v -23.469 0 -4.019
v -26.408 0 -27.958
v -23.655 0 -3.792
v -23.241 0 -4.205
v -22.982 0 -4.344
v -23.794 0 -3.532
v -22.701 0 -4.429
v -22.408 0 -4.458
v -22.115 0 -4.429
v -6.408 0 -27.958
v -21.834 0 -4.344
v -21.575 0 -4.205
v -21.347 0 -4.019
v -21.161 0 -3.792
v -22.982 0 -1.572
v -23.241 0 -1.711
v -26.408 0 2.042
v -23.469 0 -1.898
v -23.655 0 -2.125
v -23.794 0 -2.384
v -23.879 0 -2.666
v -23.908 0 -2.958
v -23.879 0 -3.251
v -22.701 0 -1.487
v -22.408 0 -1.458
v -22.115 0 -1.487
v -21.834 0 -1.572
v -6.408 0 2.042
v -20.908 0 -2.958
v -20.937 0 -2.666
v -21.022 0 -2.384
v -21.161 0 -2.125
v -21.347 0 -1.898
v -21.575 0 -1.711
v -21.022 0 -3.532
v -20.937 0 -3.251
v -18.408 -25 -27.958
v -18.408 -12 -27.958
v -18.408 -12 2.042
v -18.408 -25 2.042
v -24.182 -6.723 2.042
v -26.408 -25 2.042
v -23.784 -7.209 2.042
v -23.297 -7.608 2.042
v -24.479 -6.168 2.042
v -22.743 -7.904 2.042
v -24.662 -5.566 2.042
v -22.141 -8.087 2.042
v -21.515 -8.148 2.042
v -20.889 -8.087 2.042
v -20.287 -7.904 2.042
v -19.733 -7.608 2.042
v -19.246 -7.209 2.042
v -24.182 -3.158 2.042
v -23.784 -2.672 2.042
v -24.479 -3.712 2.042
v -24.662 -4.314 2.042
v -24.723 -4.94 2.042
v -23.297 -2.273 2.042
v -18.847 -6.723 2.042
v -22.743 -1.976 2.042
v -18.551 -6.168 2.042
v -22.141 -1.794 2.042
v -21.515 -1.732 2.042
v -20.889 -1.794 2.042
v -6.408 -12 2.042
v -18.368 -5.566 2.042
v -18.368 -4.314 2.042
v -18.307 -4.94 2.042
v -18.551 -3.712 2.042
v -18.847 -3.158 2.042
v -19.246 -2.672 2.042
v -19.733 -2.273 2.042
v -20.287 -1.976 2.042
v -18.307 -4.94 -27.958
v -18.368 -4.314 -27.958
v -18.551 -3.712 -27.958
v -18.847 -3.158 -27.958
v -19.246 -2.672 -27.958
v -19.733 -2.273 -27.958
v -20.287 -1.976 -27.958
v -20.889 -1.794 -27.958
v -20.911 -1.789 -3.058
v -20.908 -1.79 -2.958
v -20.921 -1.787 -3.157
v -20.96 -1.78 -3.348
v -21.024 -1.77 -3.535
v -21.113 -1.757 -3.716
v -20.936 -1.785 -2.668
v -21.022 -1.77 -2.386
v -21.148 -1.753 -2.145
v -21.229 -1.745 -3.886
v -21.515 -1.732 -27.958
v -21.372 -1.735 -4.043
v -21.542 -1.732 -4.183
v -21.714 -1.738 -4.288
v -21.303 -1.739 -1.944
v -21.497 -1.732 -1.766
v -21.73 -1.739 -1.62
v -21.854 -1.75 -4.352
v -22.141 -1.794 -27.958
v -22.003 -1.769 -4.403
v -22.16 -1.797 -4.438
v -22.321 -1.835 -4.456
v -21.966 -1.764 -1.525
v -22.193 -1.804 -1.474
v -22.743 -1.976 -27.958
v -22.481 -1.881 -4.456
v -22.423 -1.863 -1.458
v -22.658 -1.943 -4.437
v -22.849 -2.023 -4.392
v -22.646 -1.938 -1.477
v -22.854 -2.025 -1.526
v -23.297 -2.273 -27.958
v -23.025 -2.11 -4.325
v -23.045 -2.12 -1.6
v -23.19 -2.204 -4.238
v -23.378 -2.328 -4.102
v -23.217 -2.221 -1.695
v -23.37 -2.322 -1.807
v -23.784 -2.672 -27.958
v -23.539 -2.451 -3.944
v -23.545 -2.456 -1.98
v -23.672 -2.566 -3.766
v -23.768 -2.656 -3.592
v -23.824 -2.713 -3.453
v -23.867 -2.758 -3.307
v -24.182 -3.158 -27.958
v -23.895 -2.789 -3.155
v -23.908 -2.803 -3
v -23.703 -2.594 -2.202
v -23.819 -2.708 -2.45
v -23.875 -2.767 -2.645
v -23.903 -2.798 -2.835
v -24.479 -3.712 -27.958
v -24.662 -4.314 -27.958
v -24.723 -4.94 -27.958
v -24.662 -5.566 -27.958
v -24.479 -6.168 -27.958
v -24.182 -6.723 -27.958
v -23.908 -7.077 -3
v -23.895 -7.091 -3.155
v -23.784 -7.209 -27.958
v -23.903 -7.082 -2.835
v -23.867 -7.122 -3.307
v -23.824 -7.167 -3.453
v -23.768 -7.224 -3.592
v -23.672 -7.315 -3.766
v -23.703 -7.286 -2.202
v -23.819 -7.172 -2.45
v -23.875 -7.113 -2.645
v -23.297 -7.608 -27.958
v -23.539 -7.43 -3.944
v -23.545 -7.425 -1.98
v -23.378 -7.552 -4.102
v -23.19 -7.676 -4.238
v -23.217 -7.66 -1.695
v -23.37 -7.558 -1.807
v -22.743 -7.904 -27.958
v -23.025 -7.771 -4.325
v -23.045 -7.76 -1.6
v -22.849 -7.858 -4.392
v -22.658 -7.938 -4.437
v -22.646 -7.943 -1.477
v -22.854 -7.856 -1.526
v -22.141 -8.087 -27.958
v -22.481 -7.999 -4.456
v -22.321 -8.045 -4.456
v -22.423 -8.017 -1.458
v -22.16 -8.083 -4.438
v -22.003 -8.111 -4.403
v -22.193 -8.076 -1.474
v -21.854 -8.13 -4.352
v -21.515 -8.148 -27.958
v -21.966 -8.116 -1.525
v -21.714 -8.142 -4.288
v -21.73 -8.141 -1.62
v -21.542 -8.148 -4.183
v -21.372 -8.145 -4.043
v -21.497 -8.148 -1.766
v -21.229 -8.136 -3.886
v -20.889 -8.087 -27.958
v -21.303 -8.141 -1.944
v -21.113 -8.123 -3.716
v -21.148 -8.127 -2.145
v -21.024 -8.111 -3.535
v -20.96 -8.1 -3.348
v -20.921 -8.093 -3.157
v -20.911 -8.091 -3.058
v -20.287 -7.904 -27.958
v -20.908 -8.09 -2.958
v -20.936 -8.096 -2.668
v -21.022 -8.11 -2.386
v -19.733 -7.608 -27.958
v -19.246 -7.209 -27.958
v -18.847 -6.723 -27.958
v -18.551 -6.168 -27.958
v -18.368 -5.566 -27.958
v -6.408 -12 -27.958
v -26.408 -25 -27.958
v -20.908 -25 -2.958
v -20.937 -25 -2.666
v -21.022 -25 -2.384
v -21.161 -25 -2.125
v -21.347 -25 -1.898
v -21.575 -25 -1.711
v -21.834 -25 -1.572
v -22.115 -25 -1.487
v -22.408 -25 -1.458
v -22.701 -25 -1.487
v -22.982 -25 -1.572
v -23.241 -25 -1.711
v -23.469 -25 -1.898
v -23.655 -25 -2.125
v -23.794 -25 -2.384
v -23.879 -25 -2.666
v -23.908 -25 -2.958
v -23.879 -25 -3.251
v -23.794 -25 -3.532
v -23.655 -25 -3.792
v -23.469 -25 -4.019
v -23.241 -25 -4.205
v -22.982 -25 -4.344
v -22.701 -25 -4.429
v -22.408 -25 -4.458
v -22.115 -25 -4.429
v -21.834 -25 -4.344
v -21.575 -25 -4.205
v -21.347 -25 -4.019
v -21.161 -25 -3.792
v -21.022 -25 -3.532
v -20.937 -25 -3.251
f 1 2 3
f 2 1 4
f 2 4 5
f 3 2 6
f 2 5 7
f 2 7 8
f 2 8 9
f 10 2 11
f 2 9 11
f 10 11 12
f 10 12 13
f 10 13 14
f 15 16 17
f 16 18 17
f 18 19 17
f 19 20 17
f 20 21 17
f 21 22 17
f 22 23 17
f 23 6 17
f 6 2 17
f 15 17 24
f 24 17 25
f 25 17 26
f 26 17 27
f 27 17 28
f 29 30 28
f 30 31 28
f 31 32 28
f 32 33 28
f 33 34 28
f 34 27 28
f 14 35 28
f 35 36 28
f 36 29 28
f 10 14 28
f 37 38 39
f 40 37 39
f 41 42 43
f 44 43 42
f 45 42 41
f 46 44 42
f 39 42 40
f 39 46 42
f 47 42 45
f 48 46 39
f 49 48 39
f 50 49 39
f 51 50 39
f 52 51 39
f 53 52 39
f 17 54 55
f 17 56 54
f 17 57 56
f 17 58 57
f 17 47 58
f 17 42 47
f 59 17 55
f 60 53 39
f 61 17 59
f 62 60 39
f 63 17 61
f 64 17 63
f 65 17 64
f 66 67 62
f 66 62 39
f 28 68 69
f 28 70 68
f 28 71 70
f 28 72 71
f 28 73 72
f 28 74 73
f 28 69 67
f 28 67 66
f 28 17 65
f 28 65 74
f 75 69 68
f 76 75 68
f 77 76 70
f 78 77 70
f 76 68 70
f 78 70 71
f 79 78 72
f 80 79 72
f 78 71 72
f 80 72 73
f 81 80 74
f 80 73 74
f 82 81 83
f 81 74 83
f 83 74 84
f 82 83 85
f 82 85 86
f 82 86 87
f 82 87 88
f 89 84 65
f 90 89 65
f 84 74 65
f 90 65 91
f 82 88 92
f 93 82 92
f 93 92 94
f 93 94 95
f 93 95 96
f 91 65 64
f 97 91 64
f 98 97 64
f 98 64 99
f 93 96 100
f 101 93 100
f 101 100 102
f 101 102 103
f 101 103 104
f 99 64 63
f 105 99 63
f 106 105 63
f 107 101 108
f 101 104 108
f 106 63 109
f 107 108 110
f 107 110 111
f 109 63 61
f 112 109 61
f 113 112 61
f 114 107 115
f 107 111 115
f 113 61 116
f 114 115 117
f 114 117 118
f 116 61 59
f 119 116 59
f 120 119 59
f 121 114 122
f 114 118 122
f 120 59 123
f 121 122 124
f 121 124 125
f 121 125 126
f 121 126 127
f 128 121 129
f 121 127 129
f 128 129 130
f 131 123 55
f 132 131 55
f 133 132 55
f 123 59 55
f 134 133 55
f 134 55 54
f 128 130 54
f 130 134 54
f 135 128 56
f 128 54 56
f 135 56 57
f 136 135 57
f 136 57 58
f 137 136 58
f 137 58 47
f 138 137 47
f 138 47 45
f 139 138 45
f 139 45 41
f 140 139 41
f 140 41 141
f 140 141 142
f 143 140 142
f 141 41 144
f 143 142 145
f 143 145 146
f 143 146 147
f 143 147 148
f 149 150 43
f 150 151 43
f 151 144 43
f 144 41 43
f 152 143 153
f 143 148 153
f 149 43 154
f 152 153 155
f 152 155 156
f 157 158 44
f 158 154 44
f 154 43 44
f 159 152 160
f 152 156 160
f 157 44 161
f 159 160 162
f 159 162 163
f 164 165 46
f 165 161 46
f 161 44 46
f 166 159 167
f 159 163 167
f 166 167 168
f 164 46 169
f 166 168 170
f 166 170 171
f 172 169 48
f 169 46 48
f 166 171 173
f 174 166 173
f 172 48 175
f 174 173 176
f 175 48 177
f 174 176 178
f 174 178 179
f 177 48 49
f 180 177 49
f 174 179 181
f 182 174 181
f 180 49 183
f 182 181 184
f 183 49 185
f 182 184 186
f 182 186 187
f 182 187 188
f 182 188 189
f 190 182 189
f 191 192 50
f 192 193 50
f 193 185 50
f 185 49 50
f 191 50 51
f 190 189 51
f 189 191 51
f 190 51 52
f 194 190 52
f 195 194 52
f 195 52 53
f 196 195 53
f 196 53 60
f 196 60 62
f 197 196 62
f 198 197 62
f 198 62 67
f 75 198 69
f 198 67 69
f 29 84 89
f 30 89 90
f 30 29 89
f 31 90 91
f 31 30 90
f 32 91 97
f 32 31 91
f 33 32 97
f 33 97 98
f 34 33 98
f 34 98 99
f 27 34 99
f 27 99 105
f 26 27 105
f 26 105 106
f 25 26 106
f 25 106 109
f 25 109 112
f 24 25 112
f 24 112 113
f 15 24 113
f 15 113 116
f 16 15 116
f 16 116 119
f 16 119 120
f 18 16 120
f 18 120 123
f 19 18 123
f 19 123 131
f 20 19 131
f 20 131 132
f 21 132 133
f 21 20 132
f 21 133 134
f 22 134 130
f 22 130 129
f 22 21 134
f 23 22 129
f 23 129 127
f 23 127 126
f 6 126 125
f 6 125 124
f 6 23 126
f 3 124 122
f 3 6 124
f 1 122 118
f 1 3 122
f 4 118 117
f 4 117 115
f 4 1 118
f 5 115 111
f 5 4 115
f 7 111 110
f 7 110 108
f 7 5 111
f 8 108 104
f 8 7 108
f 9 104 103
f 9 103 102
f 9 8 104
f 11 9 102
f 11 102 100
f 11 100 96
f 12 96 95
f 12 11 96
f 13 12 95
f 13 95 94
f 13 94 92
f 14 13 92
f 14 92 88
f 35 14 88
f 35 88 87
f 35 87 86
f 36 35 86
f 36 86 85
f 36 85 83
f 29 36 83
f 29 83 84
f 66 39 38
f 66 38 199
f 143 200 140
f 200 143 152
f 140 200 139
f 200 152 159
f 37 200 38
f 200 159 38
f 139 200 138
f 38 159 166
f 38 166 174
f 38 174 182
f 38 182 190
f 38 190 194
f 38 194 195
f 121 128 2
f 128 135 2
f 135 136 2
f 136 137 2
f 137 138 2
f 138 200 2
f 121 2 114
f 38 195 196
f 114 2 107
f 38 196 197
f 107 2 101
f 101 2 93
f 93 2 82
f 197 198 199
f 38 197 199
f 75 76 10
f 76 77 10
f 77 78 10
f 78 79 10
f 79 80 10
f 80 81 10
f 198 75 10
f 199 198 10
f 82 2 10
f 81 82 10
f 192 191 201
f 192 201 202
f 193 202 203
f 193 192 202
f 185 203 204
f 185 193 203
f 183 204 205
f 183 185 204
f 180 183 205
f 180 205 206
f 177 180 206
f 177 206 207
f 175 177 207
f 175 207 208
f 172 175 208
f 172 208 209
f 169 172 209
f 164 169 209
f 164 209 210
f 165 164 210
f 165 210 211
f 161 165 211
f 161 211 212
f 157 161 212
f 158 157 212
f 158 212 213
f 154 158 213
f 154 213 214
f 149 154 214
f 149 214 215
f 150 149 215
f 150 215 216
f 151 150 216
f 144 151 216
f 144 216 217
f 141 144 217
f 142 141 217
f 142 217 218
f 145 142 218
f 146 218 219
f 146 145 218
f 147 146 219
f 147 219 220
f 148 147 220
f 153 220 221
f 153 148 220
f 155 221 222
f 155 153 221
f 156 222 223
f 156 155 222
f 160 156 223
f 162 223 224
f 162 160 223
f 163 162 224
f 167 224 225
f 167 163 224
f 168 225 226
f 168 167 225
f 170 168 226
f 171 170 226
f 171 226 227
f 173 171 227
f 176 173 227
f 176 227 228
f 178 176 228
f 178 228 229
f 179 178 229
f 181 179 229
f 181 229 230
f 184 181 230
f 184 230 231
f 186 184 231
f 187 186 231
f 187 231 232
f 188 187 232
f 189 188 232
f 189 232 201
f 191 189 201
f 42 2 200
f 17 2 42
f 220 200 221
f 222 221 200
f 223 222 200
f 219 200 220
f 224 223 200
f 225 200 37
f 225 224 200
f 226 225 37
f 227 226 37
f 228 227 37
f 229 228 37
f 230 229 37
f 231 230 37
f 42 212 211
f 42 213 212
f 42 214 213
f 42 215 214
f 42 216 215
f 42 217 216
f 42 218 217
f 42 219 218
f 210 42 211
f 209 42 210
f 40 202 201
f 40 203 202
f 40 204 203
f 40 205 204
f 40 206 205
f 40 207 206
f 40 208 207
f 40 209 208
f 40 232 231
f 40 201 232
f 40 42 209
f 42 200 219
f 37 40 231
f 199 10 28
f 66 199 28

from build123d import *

# Parameters (mm, degrees)
F0_W     = 8
F0_H     = 30
F0_R     = 1.5
F1_DEPTH = 25
F0_W_2   = 12
F2_DEPTH = 12
F3_R     = 3.208218
F4_DEPTH = 333


with BuildPart() as f1:
    # F0 (on Front) → F1 (new body)
    with BuildSketch(Plane.XZ):
        with Locations((-22.408133, -12.958233)):
            Rectangle(F0_W, F0_H)
        with Locations((-22.408133, -2.958233)):
            Circle(F0_R, mode=Mode.SUBTRACT)
    extrude(amount=F1_DEPTH)

    # F0 (on Front) → F2 (join)
    with BuildSketch(Plane.XZ):
        with Locations((-12.408133, -12.958233)):
            Rectangle(F0_W_2, F0_H)
    extrude(amount=F2_DEPTH)

    # F3 (on face) → F4 (cut)
    with BuildSketch(Plane.XY.offset(2.041767)):
        with Locations((-21.514958, -4.940173)):
            Circle(F3_R)
    extrude(amount=-F4_DEPTH, mode=Mode.SUBTRACT)


solid = f1.part
